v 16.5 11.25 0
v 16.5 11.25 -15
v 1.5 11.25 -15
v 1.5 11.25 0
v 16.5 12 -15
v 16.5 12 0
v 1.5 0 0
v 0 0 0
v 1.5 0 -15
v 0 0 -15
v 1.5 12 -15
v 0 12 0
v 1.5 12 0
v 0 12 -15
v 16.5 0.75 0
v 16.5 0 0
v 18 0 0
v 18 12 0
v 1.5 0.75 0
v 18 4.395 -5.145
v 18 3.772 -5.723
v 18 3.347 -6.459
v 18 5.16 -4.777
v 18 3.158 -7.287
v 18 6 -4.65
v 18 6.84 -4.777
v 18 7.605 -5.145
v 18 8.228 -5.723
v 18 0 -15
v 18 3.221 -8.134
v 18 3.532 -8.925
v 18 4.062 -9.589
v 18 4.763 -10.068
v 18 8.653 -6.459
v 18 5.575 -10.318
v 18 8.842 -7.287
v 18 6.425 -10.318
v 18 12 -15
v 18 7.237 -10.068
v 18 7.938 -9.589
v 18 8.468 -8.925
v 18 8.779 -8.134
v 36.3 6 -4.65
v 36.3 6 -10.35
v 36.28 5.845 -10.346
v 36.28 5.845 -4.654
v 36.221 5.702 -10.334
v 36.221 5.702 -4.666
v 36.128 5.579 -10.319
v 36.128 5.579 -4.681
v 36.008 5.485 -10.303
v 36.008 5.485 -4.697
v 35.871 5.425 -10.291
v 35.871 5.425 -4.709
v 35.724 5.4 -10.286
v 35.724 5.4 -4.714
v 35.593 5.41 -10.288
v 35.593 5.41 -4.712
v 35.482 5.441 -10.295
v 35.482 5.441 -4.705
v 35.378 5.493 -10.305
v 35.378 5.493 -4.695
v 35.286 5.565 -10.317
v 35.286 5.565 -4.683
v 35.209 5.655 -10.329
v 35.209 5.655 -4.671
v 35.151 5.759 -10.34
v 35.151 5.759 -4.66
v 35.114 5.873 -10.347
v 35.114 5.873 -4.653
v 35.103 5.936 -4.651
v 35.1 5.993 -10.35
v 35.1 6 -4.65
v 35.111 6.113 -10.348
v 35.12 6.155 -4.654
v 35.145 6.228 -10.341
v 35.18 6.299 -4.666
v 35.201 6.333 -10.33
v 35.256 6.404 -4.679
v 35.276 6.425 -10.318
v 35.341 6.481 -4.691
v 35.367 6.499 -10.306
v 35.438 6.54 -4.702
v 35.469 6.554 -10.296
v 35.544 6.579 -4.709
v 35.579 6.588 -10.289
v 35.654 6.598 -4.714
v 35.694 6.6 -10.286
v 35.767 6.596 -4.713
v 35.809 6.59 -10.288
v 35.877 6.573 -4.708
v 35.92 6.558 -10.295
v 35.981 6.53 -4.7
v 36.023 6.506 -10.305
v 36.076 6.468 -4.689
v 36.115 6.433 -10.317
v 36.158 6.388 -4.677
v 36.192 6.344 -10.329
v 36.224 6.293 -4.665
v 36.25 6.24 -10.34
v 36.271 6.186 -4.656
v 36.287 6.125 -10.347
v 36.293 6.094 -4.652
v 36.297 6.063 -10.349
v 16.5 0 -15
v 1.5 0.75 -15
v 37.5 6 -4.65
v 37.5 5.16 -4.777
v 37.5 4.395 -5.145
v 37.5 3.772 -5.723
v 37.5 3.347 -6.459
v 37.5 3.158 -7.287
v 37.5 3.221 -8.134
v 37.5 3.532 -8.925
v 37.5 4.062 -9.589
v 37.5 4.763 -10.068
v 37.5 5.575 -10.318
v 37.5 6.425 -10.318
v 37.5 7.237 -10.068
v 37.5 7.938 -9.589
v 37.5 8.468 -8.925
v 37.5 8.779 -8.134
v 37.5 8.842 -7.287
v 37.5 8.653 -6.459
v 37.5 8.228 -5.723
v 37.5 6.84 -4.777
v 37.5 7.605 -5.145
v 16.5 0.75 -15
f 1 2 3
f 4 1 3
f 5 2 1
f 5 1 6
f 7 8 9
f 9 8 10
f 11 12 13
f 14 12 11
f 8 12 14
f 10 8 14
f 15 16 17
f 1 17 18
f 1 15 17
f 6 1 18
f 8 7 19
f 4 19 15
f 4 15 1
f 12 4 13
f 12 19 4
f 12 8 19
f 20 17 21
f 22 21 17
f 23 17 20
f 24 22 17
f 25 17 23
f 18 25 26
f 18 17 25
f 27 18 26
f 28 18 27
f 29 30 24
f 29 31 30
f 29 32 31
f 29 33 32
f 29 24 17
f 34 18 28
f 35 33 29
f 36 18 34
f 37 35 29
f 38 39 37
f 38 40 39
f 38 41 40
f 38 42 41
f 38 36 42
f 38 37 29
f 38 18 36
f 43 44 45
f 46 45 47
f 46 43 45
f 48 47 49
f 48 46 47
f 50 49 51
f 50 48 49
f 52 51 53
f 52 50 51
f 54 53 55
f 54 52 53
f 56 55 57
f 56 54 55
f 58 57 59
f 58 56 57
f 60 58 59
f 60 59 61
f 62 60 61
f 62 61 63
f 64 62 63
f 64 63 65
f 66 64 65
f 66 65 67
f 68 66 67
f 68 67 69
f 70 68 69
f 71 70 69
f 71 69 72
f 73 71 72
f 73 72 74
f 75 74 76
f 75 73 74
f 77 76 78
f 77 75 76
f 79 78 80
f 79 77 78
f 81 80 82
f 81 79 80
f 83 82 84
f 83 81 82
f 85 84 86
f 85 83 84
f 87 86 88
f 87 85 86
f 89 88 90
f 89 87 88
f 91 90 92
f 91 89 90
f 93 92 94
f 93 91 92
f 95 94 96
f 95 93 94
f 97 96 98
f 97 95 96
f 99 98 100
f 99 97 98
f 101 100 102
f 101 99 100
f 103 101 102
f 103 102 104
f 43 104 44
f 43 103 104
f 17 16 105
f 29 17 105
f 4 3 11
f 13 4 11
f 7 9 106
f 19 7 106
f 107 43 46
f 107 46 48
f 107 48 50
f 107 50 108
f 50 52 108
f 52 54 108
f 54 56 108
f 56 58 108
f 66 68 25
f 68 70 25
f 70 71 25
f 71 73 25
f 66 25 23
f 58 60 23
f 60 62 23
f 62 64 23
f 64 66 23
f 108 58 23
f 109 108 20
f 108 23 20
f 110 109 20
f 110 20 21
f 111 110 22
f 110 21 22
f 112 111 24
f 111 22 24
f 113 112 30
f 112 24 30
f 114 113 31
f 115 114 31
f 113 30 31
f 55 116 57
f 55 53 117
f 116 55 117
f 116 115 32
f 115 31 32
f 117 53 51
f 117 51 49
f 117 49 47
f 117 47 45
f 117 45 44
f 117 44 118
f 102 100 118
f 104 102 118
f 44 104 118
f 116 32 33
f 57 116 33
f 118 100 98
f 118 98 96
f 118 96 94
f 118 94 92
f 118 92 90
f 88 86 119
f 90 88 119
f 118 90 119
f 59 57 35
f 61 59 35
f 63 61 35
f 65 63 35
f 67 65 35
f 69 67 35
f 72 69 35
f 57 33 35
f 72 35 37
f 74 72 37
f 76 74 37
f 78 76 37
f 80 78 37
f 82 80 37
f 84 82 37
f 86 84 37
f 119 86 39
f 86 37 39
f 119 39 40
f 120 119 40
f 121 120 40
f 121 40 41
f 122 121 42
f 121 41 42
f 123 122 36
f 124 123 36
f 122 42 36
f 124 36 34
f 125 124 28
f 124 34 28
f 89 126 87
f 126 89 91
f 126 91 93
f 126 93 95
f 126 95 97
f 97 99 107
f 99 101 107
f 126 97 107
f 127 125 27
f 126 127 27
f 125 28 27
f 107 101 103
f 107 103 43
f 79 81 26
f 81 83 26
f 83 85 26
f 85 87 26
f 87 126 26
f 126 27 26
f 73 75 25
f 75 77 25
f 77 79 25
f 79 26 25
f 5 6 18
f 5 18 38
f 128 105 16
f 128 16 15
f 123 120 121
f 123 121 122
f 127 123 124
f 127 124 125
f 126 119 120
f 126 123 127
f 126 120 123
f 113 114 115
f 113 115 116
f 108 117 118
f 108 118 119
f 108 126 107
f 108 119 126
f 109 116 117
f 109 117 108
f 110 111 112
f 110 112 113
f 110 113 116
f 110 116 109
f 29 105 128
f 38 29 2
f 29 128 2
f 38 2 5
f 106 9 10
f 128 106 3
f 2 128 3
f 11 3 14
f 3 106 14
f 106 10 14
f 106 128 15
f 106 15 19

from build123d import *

# Parameters (mm, degrees)
SKETCH1_W               = 10
SKETCH1_H               = 8
BOSS_EXTRUDE5_DEPTH     = 12
SKETCH2_R               = 1.9
BOSS_EXTRUDE6_DEPTH     = 13
CUT_EXTRUDE1_DEPTH      = 3
CUT_EXTRUDE1_DEPTH_BACK = 3
SKETCH3_R               = 0.4
SKETCH4_W               = 10
SKETCH4_H               = 0.5
CUT_EXTRUDE2_DEPTH      = 10
SCALE1_SCALE            = 1.5


with BuildPart() as part:
    # Sketch1 → Boss-Extrude5 (new body)
    with BuildSketch(Plane(origin=(0, 0, 0), x_dir=(0, 0, -1), z_dir=(1, 0, 0))):
        with Locations((5, 4)):
            Rectangle(SKETCH1_W, SKETCH1_H)
    extrude(amount=BOSS_EXTRUDE5_DEPTH)

    # Sketch2 → Boss-Extrude6 (add)
    with BuildSketch(Plane(origin=(12, 0, 0), x_dir=(0, 0, -1), z_dir=(1, 0, 0))):
        with Locations(Location((5, 4, 0), (0, 0, 180))):
            Circle(SKETCH2_R)
    extrude(amount=BOSS_EXTRUDE6_DEPTH)

    # Sketch3 → Cut-Extrude1 (cut, two sides: drawn at the far end of the back side and taken through both)
    with BuildSketch(Plane(origin=(0, 0, -5), x_dir=(-1, 0, 0), z_dir=(0, 0, -1)).offset(-CUT_EXTRUDE1_DEPTH_BACK)):
        with Locations(Location((-23.8, 4, 0), (0, 0, 180))):
            Circle(SKETCH3_R)
    extrude(amount=CUT_EXTRUDE1_DEPTH + CUT_EXTRUDE1_DEPTH_BACK, mode=Mode.SUBTRACT)

    # Sketch4 → Cut-Extrude2 (cut)
    with BuildSketch(Plane(origin=(0, 0, -10), x_dir=(-1, 0, 0), z_dir=(0, 0, -1))):
        with Locations((-6, 7.75)):
            Rectangle(SKETCH4_W, SKETCH4_H)
        with Locations((-6, 0.25)):
            Rectangle(SKETCH4_W, SKETCH4_H)
    extrude(amount=-CUT_EXTRUDE2_DEPTH, mode=Mode.SUBTRACT)


with BuildPart() as part_1:
    # Scale1: scaled about (0, 0, 0)
    add(part.part.scale(SCALE1_SCALE))


solid = part_1.part
